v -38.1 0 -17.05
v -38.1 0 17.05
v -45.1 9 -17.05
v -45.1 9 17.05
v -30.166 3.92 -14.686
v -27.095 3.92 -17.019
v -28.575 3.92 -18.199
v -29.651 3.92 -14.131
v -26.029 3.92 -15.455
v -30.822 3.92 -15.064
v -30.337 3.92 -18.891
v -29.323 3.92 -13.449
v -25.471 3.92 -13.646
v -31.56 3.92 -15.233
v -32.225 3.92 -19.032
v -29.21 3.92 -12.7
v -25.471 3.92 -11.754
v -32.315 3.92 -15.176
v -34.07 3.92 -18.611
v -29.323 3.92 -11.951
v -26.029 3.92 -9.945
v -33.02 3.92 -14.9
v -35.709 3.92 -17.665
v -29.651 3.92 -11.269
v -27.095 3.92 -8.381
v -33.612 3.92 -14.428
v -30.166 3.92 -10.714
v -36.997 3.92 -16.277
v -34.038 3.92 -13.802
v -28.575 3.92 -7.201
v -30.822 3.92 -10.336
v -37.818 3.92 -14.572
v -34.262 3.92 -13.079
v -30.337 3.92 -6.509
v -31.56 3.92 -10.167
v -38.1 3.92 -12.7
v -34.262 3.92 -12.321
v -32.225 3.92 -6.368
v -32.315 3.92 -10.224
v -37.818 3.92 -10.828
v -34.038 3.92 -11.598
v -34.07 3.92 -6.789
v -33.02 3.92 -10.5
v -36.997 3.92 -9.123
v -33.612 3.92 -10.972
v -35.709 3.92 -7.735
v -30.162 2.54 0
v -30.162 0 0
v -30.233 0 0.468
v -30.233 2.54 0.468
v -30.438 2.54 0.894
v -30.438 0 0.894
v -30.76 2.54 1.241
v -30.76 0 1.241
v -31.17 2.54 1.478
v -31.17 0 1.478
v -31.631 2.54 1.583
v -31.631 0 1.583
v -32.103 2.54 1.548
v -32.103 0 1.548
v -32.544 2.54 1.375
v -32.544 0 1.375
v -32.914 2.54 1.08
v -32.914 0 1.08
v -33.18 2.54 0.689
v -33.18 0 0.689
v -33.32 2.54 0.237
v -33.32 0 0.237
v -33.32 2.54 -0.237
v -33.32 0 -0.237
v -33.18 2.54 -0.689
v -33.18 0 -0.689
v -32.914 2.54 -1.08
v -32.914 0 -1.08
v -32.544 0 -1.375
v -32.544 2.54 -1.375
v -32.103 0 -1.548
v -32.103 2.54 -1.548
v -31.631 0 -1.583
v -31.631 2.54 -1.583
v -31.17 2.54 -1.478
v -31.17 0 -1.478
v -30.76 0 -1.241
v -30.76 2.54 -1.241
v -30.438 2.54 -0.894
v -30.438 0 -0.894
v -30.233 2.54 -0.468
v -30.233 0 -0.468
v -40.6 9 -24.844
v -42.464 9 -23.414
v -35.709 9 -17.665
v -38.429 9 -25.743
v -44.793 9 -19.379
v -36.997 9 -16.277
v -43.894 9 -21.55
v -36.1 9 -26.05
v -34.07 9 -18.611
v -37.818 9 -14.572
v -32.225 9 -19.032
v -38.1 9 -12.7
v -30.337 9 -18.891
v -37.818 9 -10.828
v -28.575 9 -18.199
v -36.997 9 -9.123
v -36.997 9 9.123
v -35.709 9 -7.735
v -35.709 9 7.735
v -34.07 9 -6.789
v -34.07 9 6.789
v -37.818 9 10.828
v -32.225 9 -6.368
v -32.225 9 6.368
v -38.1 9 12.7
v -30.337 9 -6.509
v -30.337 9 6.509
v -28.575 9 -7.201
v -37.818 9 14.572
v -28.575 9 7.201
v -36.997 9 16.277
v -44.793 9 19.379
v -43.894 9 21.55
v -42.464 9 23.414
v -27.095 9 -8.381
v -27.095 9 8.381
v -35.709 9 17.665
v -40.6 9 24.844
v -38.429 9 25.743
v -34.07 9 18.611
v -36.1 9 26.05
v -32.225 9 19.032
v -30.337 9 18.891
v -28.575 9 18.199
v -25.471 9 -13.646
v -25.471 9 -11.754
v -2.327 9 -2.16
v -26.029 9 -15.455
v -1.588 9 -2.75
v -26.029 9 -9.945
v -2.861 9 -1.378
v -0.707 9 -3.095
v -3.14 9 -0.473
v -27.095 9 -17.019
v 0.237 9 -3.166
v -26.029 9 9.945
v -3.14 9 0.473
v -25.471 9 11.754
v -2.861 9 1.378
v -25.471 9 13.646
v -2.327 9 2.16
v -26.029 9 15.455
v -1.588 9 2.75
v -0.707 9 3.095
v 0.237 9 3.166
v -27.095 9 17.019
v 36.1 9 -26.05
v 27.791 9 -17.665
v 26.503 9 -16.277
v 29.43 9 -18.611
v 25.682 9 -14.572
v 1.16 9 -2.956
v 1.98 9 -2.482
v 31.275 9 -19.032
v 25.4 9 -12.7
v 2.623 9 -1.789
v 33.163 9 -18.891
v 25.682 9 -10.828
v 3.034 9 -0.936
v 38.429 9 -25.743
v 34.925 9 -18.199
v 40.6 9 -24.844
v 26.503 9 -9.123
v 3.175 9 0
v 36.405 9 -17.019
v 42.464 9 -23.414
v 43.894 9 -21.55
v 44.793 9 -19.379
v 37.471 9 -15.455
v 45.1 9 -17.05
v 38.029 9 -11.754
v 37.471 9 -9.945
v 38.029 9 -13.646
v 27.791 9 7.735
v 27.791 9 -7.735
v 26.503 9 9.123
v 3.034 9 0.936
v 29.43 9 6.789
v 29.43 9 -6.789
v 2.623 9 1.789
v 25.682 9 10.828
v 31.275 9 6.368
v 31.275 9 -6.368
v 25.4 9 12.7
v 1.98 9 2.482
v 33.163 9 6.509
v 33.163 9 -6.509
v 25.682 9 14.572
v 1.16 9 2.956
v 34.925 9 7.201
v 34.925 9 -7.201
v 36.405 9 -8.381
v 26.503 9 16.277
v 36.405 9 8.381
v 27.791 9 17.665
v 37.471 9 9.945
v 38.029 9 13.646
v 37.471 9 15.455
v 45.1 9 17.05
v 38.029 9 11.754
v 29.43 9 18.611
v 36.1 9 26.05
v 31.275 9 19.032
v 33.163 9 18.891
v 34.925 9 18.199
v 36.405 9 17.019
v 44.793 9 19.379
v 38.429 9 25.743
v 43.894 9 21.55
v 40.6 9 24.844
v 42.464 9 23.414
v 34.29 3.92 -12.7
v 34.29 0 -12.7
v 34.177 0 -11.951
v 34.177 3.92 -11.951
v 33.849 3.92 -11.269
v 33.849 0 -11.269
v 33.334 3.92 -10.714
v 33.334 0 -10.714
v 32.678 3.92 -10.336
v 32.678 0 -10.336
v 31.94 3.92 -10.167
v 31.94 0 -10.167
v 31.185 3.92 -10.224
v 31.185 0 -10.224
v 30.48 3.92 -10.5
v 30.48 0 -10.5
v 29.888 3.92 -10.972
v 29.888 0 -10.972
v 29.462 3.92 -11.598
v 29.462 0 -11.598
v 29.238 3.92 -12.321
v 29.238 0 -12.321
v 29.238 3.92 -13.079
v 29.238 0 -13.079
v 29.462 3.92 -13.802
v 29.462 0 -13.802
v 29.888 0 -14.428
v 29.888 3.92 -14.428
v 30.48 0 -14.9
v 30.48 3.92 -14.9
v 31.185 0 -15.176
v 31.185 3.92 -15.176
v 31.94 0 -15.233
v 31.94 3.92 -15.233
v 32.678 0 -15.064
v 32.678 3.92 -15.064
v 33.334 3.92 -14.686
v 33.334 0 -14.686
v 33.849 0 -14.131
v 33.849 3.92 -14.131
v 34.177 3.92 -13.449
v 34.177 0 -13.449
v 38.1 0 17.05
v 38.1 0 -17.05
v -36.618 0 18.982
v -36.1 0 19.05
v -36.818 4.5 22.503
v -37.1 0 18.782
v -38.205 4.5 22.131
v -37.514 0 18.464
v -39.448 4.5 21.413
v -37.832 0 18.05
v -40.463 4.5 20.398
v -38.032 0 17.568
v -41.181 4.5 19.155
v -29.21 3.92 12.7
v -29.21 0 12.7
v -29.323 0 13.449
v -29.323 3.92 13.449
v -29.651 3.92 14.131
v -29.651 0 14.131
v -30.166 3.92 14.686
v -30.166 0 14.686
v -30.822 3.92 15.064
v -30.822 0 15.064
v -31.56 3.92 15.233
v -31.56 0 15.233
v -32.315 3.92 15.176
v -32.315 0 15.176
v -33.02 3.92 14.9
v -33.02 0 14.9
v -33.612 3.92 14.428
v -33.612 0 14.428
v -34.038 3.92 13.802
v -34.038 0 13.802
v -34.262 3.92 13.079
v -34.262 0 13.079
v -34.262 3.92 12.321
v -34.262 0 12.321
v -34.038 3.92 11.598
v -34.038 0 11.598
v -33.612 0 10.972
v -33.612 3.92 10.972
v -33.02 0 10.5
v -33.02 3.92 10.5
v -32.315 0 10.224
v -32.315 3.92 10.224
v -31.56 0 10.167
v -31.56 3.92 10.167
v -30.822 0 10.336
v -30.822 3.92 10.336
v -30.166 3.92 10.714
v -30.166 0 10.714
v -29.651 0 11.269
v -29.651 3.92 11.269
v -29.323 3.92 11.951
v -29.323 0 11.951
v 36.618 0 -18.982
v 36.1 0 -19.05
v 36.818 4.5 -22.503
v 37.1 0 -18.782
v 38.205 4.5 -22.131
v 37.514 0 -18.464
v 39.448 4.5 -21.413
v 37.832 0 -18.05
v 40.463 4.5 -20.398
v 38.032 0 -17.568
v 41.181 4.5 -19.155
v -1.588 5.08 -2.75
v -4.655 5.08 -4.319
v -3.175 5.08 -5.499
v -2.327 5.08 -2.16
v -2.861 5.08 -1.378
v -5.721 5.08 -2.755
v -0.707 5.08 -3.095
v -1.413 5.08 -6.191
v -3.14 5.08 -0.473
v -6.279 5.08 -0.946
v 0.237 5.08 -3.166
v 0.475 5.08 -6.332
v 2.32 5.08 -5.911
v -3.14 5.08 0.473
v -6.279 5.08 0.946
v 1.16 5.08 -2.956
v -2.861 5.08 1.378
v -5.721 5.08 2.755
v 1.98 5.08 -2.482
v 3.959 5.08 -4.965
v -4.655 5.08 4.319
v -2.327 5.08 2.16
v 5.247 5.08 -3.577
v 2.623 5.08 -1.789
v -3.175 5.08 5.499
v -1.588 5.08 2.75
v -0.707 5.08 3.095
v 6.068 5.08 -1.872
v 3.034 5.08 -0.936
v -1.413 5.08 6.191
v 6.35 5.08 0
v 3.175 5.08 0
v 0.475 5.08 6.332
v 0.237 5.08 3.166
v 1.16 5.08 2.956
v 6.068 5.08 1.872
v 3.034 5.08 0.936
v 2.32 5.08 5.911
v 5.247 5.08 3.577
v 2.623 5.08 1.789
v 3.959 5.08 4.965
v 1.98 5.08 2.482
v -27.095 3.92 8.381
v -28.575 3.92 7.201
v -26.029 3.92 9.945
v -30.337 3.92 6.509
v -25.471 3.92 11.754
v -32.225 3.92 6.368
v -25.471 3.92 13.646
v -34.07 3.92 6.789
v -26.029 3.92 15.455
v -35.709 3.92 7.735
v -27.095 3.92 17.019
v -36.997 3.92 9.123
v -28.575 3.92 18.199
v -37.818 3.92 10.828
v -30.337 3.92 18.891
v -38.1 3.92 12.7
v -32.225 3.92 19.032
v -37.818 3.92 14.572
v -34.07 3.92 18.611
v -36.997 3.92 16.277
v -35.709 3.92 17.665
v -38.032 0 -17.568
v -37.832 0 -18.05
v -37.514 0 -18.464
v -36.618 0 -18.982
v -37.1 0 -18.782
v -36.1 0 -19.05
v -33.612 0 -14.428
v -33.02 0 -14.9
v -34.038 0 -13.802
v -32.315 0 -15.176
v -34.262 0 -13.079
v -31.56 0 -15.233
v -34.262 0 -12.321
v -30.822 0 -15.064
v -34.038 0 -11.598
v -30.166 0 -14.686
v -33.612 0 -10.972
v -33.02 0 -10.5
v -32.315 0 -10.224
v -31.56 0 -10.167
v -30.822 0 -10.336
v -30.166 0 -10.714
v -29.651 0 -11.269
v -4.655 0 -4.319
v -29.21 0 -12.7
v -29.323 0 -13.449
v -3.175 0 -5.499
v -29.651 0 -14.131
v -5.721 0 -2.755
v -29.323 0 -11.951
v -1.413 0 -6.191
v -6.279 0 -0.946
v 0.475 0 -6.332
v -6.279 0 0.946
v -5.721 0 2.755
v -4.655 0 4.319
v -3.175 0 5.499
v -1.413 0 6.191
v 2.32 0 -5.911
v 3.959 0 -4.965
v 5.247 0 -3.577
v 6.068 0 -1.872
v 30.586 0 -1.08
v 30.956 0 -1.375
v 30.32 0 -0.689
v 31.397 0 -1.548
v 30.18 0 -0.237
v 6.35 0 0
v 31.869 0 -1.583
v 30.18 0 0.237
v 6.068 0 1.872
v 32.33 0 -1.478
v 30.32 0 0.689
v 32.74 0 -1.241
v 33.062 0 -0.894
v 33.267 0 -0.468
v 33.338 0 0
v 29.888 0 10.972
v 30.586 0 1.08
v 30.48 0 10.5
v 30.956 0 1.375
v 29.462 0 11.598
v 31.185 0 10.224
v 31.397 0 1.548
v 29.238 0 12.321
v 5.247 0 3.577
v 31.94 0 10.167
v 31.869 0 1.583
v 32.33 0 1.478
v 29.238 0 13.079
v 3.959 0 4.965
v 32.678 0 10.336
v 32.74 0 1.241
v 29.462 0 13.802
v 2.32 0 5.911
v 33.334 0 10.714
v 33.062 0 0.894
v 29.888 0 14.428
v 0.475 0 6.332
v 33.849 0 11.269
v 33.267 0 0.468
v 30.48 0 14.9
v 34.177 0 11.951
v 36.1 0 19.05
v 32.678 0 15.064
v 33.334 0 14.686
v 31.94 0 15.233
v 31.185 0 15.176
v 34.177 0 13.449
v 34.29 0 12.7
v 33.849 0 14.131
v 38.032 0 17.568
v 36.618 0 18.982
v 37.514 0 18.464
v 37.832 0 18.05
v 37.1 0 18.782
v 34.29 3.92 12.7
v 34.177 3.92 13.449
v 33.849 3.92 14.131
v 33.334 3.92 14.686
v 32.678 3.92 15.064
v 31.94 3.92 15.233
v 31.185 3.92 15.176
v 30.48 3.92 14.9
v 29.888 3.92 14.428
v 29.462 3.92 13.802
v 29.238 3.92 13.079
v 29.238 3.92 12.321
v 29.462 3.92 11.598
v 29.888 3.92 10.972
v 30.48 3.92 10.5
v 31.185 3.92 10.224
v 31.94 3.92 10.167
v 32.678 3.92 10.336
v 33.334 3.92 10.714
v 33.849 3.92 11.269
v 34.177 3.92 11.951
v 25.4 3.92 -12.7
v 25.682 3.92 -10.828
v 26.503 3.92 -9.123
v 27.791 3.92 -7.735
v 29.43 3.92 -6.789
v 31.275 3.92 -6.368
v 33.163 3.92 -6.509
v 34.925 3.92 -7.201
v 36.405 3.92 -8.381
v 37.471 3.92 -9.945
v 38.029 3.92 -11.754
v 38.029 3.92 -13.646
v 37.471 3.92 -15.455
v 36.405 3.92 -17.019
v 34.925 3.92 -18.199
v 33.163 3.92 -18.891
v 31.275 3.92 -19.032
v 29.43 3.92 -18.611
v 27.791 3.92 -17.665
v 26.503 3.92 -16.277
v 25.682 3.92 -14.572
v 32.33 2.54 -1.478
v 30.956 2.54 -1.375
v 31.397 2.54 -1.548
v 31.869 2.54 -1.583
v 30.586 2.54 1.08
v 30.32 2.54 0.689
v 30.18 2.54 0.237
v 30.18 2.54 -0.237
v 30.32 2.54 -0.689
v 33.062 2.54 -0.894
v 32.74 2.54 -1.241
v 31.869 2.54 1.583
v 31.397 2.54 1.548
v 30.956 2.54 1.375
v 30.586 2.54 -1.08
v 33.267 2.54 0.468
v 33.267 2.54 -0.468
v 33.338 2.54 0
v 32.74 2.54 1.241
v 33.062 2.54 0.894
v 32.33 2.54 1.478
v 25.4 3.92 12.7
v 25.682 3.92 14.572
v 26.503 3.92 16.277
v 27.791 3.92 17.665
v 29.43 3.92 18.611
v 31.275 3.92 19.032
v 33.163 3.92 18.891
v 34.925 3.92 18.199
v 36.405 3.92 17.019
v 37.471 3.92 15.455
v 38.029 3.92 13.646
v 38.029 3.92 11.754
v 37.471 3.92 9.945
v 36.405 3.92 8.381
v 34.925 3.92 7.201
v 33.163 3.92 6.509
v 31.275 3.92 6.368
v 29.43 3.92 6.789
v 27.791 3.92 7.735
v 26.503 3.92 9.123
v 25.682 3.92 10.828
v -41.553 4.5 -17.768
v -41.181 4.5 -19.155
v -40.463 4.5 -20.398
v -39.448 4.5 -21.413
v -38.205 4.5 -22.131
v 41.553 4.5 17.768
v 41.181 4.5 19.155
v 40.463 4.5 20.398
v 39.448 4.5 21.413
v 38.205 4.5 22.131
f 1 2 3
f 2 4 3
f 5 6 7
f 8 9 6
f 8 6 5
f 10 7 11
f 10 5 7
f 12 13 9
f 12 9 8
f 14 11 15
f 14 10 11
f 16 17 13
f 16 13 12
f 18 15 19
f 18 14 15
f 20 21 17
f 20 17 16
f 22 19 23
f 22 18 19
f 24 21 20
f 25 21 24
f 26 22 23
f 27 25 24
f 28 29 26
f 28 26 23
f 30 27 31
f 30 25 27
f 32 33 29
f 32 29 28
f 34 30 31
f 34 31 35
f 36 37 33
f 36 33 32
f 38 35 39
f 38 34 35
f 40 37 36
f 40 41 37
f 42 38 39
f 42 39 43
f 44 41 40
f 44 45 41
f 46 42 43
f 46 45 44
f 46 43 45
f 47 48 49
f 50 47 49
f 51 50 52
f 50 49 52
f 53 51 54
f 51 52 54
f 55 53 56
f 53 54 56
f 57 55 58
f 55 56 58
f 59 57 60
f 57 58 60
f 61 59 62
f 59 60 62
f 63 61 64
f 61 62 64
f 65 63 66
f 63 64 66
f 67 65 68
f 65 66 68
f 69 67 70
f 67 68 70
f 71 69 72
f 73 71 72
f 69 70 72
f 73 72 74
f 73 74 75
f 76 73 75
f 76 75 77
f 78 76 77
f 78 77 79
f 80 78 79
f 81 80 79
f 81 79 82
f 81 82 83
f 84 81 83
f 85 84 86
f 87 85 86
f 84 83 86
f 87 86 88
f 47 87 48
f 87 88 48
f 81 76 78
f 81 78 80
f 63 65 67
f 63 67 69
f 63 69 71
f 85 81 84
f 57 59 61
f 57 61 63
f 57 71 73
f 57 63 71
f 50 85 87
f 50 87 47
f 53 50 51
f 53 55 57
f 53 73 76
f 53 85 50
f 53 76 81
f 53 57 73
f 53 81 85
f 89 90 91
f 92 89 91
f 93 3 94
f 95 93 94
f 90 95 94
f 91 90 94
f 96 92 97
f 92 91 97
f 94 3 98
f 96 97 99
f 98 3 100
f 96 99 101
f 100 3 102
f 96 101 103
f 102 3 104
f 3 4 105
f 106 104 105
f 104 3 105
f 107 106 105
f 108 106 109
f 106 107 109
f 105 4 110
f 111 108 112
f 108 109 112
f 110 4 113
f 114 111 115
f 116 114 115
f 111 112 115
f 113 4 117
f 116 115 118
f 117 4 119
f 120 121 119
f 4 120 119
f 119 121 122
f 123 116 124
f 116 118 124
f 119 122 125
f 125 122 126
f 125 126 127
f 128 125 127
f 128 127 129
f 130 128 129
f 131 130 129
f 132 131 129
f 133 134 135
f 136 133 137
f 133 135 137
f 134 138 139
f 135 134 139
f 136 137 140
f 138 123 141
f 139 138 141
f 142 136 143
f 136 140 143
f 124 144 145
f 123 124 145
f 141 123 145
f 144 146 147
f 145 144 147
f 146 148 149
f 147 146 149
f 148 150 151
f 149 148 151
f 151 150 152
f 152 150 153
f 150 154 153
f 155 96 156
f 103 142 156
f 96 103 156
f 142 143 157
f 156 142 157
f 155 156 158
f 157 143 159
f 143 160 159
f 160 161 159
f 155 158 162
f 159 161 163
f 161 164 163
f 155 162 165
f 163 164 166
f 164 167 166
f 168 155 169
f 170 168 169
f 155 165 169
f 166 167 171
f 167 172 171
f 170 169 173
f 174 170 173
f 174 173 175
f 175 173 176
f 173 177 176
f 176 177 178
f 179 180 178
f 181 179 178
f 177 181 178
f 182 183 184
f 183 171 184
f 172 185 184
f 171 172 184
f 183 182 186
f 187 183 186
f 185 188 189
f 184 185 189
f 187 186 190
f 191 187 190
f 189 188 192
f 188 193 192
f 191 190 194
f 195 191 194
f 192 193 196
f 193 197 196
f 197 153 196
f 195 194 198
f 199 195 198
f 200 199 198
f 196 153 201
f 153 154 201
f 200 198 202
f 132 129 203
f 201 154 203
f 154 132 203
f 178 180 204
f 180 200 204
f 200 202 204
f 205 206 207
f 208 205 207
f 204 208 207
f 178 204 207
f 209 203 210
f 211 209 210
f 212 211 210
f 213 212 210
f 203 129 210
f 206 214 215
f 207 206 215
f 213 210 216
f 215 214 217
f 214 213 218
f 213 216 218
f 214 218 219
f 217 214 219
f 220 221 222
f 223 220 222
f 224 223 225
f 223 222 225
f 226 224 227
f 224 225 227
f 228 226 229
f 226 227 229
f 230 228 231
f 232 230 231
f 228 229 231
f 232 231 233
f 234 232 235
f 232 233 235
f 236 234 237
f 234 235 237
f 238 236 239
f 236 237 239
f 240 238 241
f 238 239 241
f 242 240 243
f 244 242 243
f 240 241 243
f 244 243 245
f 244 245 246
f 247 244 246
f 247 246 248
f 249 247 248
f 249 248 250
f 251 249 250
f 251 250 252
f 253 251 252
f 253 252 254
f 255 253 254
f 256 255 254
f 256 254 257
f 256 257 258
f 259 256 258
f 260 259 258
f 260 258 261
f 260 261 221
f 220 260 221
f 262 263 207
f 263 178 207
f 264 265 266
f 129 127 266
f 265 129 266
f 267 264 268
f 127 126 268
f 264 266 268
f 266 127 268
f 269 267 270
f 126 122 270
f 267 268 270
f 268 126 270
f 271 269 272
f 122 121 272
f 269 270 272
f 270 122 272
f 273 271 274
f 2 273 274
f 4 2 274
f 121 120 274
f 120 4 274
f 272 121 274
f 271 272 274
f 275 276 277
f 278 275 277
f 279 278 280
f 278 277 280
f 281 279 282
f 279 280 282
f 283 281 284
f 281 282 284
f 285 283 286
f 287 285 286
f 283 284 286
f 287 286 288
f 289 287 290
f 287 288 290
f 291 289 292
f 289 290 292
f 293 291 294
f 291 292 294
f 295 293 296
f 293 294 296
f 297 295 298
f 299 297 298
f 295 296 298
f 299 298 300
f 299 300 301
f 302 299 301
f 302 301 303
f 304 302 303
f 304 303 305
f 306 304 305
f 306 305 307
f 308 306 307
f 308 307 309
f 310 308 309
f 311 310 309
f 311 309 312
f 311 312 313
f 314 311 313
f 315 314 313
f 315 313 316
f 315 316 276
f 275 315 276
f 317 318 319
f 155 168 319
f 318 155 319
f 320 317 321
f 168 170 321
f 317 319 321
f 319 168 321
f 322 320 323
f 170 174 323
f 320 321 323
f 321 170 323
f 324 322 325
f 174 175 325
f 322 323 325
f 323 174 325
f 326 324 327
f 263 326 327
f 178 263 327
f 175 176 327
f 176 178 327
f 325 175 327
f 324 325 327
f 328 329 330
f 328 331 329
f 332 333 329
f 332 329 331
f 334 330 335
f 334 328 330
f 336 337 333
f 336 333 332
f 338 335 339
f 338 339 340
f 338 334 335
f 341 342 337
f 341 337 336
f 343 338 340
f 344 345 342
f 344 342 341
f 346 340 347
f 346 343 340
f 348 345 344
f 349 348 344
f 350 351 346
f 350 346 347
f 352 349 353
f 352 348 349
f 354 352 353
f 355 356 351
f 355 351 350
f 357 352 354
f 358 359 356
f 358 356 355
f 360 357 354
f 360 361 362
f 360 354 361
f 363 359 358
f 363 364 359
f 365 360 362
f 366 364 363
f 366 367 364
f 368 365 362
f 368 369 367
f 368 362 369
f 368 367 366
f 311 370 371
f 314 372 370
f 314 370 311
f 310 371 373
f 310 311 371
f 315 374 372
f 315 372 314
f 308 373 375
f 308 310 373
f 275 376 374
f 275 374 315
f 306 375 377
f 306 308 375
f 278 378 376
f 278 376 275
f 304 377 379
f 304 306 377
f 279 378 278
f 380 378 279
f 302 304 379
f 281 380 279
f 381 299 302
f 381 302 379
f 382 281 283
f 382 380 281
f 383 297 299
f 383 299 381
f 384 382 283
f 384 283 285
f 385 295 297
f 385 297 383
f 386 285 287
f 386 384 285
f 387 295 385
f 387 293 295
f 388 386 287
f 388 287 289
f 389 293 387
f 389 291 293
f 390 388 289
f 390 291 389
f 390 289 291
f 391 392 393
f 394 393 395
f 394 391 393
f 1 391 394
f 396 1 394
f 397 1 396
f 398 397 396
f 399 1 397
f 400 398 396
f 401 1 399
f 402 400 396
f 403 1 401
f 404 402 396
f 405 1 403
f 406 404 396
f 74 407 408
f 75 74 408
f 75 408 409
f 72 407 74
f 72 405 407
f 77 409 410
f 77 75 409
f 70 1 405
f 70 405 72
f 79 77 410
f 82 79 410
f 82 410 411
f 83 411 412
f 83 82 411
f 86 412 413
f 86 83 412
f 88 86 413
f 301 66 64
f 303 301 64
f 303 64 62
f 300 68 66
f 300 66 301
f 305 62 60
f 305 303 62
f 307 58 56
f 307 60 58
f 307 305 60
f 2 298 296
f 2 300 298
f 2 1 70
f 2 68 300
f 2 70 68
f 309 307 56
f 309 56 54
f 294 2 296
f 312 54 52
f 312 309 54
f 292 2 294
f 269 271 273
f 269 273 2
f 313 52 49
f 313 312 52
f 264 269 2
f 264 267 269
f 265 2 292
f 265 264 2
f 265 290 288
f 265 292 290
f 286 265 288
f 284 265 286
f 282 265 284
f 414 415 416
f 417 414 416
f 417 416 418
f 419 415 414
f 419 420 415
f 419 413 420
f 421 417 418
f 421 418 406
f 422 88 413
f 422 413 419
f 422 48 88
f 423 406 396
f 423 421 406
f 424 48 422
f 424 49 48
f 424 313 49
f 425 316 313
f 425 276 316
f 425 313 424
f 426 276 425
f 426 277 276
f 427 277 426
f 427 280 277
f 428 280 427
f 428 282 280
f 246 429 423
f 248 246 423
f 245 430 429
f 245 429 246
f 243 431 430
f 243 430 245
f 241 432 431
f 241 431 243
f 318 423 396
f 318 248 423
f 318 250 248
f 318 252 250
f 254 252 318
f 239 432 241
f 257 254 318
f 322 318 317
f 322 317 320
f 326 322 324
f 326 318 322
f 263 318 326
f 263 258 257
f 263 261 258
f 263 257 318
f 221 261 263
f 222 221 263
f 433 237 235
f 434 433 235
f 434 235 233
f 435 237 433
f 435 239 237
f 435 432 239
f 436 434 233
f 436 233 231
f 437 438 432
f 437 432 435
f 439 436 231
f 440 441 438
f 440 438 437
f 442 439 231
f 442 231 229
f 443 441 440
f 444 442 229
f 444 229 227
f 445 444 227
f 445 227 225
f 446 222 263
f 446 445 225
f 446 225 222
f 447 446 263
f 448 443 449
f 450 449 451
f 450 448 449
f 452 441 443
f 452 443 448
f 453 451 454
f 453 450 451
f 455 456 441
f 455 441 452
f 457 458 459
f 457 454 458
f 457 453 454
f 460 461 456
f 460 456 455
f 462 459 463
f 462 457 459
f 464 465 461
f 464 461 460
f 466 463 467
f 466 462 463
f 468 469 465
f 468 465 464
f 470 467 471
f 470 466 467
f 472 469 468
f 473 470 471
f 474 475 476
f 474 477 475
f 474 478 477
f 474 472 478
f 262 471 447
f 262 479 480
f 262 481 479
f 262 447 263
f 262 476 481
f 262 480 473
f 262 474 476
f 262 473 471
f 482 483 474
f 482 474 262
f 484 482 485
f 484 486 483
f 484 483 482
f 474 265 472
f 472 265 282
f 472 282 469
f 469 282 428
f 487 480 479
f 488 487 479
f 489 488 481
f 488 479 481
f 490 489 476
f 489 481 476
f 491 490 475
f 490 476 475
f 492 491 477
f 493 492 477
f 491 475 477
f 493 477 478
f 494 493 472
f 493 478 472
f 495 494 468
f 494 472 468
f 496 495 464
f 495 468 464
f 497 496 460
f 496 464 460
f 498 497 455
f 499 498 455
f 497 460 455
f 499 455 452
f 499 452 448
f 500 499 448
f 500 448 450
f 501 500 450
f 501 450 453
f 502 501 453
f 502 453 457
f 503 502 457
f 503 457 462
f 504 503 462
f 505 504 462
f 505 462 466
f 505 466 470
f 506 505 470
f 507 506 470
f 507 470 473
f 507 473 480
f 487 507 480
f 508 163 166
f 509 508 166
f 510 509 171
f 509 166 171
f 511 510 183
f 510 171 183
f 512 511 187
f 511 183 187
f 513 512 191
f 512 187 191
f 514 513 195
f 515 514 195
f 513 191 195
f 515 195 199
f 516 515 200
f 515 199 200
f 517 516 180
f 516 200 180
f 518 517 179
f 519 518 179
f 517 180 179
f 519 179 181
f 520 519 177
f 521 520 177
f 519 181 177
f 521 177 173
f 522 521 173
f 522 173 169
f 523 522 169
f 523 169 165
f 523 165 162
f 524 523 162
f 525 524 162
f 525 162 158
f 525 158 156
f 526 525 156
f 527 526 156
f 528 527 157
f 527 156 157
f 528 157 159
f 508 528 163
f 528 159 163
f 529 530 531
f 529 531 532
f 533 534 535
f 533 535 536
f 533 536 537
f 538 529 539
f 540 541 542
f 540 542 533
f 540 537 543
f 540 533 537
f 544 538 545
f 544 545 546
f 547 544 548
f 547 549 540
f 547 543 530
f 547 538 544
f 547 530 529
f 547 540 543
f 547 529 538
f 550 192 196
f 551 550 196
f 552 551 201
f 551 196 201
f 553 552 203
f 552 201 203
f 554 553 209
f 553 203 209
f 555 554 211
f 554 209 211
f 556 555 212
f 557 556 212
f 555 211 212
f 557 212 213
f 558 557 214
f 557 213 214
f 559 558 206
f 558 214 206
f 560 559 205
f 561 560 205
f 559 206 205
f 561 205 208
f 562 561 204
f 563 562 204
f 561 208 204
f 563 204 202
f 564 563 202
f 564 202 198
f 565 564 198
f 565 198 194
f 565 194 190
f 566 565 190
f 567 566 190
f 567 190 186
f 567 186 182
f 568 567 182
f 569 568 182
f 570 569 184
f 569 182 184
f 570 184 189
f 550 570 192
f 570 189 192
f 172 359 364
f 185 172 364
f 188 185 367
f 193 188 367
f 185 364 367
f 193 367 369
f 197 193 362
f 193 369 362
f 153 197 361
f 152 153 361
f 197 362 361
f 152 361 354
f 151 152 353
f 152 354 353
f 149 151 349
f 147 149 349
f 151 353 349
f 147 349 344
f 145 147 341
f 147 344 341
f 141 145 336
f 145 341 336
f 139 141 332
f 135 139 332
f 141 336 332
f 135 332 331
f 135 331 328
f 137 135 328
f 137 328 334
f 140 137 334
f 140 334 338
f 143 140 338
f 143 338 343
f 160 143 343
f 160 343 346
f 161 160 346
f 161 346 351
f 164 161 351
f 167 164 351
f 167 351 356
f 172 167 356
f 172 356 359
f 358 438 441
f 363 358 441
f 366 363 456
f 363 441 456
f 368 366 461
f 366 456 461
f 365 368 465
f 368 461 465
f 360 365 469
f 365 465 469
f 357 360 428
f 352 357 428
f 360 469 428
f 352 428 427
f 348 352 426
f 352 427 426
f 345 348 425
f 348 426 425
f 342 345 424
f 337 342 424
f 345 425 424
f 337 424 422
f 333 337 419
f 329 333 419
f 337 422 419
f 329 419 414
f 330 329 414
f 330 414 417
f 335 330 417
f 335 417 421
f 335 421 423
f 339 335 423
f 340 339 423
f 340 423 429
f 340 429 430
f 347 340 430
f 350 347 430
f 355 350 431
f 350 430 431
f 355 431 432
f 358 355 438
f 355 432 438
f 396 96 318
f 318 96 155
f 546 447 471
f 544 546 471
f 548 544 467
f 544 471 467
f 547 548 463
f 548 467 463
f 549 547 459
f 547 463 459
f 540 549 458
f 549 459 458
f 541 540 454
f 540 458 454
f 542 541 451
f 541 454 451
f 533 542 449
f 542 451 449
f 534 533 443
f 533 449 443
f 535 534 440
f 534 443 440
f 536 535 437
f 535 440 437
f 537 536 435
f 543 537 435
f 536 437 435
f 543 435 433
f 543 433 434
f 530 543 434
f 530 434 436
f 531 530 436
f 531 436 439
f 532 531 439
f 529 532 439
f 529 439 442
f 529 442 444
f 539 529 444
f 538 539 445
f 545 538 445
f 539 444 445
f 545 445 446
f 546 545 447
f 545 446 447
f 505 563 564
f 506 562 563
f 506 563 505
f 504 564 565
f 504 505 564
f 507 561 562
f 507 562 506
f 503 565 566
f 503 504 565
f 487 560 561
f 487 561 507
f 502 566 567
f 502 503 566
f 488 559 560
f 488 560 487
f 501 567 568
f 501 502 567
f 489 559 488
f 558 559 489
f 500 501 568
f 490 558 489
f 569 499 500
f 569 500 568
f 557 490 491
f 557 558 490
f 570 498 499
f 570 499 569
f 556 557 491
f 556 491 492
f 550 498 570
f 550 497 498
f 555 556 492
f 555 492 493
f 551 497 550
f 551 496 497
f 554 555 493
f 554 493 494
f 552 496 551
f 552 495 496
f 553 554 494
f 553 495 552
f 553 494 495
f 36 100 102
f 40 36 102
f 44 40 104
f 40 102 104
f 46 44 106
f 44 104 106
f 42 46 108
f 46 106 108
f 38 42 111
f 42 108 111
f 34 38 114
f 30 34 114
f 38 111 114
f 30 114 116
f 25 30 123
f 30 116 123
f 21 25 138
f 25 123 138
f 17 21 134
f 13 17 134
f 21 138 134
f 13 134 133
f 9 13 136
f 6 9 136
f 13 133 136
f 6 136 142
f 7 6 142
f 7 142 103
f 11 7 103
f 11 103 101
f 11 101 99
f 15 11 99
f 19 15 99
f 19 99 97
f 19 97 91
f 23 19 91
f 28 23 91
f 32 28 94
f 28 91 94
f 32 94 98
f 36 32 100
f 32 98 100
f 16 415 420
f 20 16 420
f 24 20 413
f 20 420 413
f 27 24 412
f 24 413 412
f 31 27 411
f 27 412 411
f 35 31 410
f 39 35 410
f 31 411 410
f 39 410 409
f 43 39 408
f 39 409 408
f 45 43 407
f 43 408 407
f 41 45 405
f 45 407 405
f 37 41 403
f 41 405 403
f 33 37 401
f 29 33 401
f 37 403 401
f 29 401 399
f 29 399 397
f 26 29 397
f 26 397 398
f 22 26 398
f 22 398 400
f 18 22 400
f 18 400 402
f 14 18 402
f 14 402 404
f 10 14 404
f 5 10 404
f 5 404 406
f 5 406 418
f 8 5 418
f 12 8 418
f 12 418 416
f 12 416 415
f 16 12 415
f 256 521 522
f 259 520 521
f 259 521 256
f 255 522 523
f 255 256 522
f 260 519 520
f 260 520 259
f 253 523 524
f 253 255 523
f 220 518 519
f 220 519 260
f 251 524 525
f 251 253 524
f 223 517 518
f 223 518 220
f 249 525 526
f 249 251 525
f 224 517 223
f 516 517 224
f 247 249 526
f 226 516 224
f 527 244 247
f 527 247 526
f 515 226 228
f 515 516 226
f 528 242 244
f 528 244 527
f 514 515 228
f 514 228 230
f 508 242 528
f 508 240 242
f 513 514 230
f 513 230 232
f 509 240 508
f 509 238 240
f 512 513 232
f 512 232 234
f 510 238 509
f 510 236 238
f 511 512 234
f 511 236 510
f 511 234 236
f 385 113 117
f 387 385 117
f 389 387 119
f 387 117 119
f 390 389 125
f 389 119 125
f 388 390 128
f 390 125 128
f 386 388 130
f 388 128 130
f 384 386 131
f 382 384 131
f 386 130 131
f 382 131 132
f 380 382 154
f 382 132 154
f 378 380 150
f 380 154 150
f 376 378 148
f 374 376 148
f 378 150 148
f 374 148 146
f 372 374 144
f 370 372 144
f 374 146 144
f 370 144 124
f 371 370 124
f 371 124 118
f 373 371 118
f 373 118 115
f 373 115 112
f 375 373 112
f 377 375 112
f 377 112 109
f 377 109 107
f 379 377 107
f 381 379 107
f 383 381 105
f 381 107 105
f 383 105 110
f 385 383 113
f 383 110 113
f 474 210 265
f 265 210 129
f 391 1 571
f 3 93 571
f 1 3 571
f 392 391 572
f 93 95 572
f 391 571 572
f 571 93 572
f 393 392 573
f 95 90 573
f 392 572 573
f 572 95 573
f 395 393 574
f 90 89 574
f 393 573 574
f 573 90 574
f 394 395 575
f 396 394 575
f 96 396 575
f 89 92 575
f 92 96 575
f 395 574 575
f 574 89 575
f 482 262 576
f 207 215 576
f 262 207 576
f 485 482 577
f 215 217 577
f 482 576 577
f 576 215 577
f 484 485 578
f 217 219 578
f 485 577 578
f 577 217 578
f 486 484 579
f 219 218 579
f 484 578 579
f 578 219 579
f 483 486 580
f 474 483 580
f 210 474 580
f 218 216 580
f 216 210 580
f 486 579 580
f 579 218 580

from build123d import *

# Parameters (mm, degrees)
F0_R      = 2.54
F0_R_2    = 3.175
F5_DEPTH  = 9
F6_R      = 1.5875
F7_DEPTH  = 2.54
F8_R      = 6.35
F9_DEPTH  = 5.08
F10_R     = 6.35
F11_DEPTH = 5.08


with BuildPart() as f4:
    # F1 (on Front) → F4 section 0
    with BuildSketch(Plane.XZ):
        with BuildLine():
            ThreePointArc((38.1, 17.05), (37.514214, 18.464214), (36.1, 19.05))
            Line((36.1, 19.05), (-36.1, 19.05))
            ThreePointArc((-36.1, 19.05), (-37.514214, 18.464214), (-38.1, 17.05))
            Line((-38.1, 17.05), (-38.1, -17.05))
            ThreePointArc((-38.1, -17.05), (-37.514214, -18.464214), (-36.1, -19.05))
            Line((-36.1, -19.05), (36.1, -19.05))
            ThreePointArc((36.1, -19.05), (37.514214, -18.464214), (38.1, -17.05))
            Line((38.1, -17.05), (38.1, 17.05))
        make_face()
    # F3 (on offset) → F4 section 1
    with BuildSketch(Plane.XZ.offset(-9)):
        with BuildLine():
            Line((36.1, 26.05), (-36.1, 26.05))
            ThreePointArc((-36.1, 26.05), (-42.463961, 23.413961), (-45.1, 17.05))
            Line((-45.1, 17.05), (-45.1, -17.05))
            ThreePointArc((-45.1, -17.05), (-42.463961, -23.413961), (-36.1, -26.05))
            Line((-36.1, -26.05), (36.1, -26.05))
            ThreePointArc((36.1, -26.05), (42.463961, -23.413961), (45.1, -17.05))
            Line((45.1, -17.05), (45.1, 17.05))
            ThreePointArc((45.1, 17.05), (42.463961, 23.413961), (36.1, 26.05))
        make_face()
    loft()

    # F0 (on Front) → F5 (cut, through all)
    with BuildSketch(Plane.XZ):
        with Locations((31.75, -12.7)):
            Circle(F0_R)
        with Locations((31.75, 12.7)):
            Circle(F0_R)
        with Locations((-31.75, -12.7)):
            Circle(F0_R)
        with Locations((-31.75, 12.7)):
            Circle(F0_R)
        Circle(F0_R_2)
    extrude(amount=-F5_DEPTH, mode=Mode.SUBTRACT)

    # F6 (on face) → F7 (cut)
    with BuildSketch(Plane.XZ):
        with Locations((31.75, 0)):
            Circle(F6_R)
        with Locations((-31.75, 0)):
            Circle(F6_R)
    extrude(amount=-F7_DEPTH, mode=Mode.SUBTRACT)

    # F8 (on face) → F9 (cut)
    with BuildSketch(Plane.XZ):
        Circle(F8_R)
    extrude(amount=-F9_DEPTH, mode=Mode.SUBTRACT)

    # F10 (on face) → F11 (cut)
    with BuildSketch(Plane(origin=(0, 9, 0), x_dir=(-1, 0, 0), z_dir=(0, 1, 0))):
        with Locations((-31.75, 12.7)):
            Circle(F10_R)
        with Locations((-31.75, -12.7)):
            Circle(F10_R)
        with Locations((31.75, 12.7)):
            Circle(F10_R)
        with Locations((31.75, -12.7)):
            Circle(F10_R)
    extrude(amount=-F11_DEPTH, mode=Mode.SUBTRACT)


solid = f4.part
